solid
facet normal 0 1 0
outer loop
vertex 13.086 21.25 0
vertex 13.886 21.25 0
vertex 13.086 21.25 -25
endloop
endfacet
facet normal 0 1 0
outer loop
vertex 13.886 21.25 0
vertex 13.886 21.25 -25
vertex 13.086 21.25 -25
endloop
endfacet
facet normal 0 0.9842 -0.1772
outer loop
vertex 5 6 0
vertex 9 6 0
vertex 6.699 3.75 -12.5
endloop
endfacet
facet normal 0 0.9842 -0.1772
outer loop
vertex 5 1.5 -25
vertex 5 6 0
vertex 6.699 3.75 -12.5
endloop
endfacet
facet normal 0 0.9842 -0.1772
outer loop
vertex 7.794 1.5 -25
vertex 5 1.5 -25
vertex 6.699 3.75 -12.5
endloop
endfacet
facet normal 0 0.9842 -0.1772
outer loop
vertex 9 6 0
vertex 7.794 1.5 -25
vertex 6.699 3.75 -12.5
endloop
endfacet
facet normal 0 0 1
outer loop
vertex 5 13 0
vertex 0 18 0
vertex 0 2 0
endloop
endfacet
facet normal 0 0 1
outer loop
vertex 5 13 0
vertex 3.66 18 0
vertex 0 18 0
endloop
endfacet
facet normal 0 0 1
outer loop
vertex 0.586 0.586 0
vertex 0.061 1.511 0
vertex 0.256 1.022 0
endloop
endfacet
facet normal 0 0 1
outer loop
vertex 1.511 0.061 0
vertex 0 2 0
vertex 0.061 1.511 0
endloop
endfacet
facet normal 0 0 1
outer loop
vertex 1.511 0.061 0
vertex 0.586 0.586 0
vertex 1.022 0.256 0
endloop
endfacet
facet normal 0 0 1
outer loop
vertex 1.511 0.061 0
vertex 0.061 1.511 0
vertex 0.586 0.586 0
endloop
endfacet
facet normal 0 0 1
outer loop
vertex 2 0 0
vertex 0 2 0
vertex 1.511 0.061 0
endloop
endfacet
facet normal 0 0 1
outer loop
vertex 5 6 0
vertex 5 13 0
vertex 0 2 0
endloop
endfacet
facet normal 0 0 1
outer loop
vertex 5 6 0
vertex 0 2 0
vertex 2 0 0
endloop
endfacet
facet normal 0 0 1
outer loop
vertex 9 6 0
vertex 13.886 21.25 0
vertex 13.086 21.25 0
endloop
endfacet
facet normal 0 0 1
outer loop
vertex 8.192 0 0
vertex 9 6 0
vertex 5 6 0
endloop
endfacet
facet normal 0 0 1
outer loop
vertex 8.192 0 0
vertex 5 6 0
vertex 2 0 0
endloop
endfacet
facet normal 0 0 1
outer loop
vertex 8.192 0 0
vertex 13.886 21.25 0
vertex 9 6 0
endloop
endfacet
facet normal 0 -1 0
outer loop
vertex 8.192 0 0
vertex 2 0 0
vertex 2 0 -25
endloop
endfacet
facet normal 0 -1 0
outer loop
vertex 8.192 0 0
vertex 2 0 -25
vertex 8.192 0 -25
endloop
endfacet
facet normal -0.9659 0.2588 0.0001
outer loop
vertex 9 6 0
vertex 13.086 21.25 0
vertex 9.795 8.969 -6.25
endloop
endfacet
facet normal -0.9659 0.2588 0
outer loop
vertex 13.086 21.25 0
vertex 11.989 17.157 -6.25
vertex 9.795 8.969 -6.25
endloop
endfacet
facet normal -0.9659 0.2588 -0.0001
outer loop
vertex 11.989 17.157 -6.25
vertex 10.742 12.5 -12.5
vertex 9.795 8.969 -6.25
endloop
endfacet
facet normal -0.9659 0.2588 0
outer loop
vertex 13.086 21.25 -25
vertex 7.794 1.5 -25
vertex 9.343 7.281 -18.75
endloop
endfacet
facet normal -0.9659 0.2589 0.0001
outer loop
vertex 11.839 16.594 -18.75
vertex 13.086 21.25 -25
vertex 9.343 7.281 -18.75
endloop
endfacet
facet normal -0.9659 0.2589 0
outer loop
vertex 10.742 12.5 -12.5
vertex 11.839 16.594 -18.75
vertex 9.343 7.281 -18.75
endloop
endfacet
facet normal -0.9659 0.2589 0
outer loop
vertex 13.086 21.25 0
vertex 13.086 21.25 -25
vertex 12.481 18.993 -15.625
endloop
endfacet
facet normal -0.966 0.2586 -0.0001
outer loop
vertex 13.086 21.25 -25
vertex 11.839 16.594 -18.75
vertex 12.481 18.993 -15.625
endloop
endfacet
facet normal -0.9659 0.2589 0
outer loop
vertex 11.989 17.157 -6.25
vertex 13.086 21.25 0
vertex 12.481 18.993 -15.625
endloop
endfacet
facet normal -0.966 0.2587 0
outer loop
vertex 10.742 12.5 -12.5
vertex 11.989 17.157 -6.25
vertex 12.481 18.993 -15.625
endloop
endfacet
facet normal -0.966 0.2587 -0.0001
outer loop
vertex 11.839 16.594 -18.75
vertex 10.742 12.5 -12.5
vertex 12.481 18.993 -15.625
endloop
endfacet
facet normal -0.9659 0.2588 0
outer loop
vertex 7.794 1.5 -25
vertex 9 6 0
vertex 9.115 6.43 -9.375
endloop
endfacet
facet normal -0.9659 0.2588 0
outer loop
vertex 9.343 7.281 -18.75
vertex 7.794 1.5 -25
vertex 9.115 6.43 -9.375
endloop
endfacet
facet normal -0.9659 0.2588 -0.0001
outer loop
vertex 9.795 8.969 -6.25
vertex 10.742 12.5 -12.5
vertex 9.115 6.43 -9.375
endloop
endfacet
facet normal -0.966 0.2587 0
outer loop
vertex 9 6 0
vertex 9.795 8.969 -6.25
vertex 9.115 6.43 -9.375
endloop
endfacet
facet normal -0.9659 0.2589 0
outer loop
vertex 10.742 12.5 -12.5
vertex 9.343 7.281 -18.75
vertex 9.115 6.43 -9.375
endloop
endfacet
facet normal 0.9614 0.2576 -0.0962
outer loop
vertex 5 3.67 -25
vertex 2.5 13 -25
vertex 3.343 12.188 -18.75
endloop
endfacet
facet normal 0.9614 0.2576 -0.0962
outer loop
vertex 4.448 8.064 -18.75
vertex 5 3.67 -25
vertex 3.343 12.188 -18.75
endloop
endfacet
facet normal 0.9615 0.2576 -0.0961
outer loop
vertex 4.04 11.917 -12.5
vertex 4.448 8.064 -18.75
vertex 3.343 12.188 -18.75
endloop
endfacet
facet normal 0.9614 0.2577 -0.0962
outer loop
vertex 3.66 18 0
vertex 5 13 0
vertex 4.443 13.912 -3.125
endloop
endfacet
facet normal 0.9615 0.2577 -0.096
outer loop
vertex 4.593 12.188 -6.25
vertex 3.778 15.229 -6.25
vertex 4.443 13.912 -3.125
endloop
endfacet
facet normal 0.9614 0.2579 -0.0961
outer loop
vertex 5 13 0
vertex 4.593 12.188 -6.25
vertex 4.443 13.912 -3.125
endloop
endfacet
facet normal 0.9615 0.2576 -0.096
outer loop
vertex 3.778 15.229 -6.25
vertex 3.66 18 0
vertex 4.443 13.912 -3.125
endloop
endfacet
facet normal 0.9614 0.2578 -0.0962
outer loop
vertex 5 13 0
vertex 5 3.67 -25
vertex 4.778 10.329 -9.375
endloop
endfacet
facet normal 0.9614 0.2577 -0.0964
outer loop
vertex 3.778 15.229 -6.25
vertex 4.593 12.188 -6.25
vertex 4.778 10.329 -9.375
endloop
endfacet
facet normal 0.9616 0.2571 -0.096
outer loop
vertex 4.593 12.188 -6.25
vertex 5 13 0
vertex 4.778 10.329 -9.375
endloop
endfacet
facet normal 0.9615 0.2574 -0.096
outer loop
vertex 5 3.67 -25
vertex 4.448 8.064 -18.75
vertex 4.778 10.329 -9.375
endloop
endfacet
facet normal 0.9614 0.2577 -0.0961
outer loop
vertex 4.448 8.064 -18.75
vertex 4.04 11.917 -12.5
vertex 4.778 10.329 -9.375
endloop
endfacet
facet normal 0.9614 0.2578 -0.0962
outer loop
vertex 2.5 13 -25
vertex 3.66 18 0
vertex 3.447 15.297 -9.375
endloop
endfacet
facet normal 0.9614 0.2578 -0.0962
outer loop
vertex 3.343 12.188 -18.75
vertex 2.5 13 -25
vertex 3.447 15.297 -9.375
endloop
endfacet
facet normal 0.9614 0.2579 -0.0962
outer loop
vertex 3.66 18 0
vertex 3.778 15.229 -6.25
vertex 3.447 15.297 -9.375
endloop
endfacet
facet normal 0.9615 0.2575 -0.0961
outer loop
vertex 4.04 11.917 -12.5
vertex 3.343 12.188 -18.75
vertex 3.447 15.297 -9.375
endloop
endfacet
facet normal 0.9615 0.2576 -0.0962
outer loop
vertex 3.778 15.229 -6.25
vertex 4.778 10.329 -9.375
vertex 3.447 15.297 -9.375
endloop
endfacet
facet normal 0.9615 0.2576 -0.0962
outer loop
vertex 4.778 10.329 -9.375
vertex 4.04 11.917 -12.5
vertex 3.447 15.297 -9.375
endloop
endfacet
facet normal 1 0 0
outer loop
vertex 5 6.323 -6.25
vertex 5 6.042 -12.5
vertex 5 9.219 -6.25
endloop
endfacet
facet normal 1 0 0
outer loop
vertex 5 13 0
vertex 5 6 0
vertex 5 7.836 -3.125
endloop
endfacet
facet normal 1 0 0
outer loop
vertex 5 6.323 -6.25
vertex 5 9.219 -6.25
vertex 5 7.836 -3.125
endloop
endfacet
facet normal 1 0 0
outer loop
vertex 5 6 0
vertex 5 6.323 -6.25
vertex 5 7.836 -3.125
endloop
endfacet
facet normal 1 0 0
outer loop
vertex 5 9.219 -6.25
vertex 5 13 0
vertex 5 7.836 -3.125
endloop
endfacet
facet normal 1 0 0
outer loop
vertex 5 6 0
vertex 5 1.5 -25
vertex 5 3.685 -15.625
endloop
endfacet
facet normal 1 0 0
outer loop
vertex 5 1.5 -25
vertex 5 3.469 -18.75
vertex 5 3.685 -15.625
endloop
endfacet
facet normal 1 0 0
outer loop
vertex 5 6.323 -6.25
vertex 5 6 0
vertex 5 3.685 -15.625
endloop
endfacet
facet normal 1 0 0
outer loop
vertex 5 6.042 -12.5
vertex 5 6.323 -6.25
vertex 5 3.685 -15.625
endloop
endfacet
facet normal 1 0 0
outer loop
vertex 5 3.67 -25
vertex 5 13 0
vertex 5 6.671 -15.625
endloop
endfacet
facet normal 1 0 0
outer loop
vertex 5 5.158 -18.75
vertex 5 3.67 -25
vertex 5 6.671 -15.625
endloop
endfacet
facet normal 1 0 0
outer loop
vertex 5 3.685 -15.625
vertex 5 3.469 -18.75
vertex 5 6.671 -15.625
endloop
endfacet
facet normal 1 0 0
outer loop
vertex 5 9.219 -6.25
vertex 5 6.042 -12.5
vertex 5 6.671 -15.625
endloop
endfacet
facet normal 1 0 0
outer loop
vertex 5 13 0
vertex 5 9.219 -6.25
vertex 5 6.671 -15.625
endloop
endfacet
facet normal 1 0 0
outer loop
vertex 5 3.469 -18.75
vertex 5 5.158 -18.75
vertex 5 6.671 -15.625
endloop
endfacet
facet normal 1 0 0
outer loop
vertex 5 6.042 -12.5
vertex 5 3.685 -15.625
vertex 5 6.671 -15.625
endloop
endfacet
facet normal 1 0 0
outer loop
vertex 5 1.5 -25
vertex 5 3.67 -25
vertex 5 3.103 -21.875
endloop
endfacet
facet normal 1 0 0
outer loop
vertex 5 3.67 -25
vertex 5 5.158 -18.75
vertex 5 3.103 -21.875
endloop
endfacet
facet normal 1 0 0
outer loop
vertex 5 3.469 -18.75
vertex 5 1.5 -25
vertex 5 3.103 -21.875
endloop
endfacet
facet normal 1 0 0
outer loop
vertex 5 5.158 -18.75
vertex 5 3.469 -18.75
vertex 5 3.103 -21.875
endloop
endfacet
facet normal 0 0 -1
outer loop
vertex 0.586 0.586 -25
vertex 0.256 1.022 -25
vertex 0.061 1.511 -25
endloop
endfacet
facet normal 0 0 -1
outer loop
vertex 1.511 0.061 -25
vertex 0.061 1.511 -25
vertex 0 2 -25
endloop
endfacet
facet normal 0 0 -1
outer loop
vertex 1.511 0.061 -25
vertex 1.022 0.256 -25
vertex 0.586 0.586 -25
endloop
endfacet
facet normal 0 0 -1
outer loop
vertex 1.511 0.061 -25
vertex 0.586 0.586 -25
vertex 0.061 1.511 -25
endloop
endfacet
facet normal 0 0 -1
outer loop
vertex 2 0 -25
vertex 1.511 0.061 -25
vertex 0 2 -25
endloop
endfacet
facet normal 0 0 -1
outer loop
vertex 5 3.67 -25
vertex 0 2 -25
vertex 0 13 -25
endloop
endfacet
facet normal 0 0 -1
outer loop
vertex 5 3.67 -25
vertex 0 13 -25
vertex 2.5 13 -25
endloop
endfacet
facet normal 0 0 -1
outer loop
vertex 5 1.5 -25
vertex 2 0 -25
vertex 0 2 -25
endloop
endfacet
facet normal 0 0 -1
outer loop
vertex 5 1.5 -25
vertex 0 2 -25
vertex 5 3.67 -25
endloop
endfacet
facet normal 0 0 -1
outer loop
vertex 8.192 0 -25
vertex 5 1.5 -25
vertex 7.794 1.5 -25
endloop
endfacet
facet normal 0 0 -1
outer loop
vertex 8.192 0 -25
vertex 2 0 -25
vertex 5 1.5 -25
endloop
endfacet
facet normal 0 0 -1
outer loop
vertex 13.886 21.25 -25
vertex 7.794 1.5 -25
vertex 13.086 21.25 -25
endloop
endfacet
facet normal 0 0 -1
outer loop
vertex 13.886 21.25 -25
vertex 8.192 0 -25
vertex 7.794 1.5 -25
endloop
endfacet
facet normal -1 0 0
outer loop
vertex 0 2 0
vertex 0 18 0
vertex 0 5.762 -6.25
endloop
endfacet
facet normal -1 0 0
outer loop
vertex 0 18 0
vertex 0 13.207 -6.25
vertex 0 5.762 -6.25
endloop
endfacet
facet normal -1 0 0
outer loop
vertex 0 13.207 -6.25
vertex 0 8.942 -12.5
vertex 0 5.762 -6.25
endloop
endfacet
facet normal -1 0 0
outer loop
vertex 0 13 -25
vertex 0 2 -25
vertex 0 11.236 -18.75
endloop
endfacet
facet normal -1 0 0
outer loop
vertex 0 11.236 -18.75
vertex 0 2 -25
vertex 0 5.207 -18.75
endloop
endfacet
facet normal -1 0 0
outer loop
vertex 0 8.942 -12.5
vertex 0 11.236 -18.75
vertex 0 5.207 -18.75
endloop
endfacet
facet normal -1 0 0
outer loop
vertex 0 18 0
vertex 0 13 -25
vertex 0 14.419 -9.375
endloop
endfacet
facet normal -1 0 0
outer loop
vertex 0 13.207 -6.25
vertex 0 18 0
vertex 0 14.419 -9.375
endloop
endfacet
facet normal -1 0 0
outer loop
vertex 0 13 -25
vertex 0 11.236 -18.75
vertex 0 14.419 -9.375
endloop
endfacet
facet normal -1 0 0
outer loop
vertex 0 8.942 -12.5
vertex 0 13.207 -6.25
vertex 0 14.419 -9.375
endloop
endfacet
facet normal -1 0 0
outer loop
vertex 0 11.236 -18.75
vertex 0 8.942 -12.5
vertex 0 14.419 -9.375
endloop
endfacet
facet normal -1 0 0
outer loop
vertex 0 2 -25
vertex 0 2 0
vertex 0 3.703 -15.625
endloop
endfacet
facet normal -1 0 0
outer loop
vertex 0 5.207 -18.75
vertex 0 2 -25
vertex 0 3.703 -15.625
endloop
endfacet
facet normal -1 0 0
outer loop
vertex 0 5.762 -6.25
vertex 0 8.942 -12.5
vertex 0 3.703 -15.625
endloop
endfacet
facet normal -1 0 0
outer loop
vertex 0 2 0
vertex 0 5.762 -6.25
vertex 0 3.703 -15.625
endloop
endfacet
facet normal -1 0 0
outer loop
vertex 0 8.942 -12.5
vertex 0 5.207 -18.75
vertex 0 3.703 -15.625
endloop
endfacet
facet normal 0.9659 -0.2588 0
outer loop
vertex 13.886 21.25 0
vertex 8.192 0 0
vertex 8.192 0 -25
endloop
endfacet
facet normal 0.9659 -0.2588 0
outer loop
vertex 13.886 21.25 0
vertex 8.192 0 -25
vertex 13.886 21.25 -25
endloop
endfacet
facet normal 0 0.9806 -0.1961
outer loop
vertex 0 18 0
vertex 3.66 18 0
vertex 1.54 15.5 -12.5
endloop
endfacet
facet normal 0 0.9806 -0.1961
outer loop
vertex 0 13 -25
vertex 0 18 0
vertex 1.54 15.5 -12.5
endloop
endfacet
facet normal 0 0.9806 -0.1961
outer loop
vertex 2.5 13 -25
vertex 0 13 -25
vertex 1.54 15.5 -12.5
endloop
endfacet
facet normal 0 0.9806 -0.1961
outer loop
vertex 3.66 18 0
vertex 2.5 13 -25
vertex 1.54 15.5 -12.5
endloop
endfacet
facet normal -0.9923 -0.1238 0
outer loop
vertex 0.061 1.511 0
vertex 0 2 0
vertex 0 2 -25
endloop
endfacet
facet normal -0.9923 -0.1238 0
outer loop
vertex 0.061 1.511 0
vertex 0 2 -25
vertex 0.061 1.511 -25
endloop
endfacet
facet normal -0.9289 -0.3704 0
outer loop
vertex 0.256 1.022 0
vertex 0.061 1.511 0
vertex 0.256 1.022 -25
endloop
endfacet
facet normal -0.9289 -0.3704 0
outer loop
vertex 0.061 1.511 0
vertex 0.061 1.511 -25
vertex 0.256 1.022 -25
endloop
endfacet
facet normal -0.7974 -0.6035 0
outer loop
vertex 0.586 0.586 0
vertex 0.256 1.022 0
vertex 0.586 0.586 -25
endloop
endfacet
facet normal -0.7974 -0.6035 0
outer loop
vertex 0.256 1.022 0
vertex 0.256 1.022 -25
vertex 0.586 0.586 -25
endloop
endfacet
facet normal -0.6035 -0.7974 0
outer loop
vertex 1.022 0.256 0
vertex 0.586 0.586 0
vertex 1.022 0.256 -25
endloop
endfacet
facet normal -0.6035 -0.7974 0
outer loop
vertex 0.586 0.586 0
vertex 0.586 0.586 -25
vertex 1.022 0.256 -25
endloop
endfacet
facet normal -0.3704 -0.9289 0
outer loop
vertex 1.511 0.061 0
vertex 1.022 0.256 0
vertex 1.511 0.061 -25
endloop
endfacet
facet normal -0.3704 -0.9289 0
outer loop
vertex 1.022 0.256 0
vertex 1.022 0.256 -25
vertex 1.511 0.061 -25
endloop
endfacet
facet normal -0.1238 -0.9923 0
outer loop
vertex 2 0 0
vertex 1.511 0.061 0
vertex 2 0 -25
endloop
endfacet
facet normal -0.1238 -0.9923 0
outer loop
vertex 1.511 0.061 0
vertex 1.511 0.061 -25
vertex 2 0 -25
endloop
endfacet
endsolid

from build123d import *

# Parameters (mm, degrees)
F4_R = 2


with BuildPart() as f3:
    # F0 (on Top) → F3 section 0
    with BuildSketch(Plane.XY):
        Polygon((0, 18), (0, 0), (8.1923048454, 0), (13.8863238377, 21.2503681784), (13.0863238377, 21.2503681784), (9, 6), (5, 6), (5, 13), (3.6602540378, 18), align=None)
    # F2 (on offset) → F3 section 1
    with BuildSketch(Plane.XY.offset(-25)):
        Polygon((0, 13), (0, 0), (8.1923048454, 0), (13.8863238377, 21.2503681784), (13.0863238377, 21.2503681784), (7.7942286341, 1.5), (5, 1.5), (5, 3.6698729811), (2.5, 13), align=None)
    loft()

    # F4
    f4_edges = [f3.edges().sort_by_distance(p)[0] for p in [
        (0, 0, -12.5),
    ]]
    fillet(f4_edges, radius=F4_R)


solid = f3.part
